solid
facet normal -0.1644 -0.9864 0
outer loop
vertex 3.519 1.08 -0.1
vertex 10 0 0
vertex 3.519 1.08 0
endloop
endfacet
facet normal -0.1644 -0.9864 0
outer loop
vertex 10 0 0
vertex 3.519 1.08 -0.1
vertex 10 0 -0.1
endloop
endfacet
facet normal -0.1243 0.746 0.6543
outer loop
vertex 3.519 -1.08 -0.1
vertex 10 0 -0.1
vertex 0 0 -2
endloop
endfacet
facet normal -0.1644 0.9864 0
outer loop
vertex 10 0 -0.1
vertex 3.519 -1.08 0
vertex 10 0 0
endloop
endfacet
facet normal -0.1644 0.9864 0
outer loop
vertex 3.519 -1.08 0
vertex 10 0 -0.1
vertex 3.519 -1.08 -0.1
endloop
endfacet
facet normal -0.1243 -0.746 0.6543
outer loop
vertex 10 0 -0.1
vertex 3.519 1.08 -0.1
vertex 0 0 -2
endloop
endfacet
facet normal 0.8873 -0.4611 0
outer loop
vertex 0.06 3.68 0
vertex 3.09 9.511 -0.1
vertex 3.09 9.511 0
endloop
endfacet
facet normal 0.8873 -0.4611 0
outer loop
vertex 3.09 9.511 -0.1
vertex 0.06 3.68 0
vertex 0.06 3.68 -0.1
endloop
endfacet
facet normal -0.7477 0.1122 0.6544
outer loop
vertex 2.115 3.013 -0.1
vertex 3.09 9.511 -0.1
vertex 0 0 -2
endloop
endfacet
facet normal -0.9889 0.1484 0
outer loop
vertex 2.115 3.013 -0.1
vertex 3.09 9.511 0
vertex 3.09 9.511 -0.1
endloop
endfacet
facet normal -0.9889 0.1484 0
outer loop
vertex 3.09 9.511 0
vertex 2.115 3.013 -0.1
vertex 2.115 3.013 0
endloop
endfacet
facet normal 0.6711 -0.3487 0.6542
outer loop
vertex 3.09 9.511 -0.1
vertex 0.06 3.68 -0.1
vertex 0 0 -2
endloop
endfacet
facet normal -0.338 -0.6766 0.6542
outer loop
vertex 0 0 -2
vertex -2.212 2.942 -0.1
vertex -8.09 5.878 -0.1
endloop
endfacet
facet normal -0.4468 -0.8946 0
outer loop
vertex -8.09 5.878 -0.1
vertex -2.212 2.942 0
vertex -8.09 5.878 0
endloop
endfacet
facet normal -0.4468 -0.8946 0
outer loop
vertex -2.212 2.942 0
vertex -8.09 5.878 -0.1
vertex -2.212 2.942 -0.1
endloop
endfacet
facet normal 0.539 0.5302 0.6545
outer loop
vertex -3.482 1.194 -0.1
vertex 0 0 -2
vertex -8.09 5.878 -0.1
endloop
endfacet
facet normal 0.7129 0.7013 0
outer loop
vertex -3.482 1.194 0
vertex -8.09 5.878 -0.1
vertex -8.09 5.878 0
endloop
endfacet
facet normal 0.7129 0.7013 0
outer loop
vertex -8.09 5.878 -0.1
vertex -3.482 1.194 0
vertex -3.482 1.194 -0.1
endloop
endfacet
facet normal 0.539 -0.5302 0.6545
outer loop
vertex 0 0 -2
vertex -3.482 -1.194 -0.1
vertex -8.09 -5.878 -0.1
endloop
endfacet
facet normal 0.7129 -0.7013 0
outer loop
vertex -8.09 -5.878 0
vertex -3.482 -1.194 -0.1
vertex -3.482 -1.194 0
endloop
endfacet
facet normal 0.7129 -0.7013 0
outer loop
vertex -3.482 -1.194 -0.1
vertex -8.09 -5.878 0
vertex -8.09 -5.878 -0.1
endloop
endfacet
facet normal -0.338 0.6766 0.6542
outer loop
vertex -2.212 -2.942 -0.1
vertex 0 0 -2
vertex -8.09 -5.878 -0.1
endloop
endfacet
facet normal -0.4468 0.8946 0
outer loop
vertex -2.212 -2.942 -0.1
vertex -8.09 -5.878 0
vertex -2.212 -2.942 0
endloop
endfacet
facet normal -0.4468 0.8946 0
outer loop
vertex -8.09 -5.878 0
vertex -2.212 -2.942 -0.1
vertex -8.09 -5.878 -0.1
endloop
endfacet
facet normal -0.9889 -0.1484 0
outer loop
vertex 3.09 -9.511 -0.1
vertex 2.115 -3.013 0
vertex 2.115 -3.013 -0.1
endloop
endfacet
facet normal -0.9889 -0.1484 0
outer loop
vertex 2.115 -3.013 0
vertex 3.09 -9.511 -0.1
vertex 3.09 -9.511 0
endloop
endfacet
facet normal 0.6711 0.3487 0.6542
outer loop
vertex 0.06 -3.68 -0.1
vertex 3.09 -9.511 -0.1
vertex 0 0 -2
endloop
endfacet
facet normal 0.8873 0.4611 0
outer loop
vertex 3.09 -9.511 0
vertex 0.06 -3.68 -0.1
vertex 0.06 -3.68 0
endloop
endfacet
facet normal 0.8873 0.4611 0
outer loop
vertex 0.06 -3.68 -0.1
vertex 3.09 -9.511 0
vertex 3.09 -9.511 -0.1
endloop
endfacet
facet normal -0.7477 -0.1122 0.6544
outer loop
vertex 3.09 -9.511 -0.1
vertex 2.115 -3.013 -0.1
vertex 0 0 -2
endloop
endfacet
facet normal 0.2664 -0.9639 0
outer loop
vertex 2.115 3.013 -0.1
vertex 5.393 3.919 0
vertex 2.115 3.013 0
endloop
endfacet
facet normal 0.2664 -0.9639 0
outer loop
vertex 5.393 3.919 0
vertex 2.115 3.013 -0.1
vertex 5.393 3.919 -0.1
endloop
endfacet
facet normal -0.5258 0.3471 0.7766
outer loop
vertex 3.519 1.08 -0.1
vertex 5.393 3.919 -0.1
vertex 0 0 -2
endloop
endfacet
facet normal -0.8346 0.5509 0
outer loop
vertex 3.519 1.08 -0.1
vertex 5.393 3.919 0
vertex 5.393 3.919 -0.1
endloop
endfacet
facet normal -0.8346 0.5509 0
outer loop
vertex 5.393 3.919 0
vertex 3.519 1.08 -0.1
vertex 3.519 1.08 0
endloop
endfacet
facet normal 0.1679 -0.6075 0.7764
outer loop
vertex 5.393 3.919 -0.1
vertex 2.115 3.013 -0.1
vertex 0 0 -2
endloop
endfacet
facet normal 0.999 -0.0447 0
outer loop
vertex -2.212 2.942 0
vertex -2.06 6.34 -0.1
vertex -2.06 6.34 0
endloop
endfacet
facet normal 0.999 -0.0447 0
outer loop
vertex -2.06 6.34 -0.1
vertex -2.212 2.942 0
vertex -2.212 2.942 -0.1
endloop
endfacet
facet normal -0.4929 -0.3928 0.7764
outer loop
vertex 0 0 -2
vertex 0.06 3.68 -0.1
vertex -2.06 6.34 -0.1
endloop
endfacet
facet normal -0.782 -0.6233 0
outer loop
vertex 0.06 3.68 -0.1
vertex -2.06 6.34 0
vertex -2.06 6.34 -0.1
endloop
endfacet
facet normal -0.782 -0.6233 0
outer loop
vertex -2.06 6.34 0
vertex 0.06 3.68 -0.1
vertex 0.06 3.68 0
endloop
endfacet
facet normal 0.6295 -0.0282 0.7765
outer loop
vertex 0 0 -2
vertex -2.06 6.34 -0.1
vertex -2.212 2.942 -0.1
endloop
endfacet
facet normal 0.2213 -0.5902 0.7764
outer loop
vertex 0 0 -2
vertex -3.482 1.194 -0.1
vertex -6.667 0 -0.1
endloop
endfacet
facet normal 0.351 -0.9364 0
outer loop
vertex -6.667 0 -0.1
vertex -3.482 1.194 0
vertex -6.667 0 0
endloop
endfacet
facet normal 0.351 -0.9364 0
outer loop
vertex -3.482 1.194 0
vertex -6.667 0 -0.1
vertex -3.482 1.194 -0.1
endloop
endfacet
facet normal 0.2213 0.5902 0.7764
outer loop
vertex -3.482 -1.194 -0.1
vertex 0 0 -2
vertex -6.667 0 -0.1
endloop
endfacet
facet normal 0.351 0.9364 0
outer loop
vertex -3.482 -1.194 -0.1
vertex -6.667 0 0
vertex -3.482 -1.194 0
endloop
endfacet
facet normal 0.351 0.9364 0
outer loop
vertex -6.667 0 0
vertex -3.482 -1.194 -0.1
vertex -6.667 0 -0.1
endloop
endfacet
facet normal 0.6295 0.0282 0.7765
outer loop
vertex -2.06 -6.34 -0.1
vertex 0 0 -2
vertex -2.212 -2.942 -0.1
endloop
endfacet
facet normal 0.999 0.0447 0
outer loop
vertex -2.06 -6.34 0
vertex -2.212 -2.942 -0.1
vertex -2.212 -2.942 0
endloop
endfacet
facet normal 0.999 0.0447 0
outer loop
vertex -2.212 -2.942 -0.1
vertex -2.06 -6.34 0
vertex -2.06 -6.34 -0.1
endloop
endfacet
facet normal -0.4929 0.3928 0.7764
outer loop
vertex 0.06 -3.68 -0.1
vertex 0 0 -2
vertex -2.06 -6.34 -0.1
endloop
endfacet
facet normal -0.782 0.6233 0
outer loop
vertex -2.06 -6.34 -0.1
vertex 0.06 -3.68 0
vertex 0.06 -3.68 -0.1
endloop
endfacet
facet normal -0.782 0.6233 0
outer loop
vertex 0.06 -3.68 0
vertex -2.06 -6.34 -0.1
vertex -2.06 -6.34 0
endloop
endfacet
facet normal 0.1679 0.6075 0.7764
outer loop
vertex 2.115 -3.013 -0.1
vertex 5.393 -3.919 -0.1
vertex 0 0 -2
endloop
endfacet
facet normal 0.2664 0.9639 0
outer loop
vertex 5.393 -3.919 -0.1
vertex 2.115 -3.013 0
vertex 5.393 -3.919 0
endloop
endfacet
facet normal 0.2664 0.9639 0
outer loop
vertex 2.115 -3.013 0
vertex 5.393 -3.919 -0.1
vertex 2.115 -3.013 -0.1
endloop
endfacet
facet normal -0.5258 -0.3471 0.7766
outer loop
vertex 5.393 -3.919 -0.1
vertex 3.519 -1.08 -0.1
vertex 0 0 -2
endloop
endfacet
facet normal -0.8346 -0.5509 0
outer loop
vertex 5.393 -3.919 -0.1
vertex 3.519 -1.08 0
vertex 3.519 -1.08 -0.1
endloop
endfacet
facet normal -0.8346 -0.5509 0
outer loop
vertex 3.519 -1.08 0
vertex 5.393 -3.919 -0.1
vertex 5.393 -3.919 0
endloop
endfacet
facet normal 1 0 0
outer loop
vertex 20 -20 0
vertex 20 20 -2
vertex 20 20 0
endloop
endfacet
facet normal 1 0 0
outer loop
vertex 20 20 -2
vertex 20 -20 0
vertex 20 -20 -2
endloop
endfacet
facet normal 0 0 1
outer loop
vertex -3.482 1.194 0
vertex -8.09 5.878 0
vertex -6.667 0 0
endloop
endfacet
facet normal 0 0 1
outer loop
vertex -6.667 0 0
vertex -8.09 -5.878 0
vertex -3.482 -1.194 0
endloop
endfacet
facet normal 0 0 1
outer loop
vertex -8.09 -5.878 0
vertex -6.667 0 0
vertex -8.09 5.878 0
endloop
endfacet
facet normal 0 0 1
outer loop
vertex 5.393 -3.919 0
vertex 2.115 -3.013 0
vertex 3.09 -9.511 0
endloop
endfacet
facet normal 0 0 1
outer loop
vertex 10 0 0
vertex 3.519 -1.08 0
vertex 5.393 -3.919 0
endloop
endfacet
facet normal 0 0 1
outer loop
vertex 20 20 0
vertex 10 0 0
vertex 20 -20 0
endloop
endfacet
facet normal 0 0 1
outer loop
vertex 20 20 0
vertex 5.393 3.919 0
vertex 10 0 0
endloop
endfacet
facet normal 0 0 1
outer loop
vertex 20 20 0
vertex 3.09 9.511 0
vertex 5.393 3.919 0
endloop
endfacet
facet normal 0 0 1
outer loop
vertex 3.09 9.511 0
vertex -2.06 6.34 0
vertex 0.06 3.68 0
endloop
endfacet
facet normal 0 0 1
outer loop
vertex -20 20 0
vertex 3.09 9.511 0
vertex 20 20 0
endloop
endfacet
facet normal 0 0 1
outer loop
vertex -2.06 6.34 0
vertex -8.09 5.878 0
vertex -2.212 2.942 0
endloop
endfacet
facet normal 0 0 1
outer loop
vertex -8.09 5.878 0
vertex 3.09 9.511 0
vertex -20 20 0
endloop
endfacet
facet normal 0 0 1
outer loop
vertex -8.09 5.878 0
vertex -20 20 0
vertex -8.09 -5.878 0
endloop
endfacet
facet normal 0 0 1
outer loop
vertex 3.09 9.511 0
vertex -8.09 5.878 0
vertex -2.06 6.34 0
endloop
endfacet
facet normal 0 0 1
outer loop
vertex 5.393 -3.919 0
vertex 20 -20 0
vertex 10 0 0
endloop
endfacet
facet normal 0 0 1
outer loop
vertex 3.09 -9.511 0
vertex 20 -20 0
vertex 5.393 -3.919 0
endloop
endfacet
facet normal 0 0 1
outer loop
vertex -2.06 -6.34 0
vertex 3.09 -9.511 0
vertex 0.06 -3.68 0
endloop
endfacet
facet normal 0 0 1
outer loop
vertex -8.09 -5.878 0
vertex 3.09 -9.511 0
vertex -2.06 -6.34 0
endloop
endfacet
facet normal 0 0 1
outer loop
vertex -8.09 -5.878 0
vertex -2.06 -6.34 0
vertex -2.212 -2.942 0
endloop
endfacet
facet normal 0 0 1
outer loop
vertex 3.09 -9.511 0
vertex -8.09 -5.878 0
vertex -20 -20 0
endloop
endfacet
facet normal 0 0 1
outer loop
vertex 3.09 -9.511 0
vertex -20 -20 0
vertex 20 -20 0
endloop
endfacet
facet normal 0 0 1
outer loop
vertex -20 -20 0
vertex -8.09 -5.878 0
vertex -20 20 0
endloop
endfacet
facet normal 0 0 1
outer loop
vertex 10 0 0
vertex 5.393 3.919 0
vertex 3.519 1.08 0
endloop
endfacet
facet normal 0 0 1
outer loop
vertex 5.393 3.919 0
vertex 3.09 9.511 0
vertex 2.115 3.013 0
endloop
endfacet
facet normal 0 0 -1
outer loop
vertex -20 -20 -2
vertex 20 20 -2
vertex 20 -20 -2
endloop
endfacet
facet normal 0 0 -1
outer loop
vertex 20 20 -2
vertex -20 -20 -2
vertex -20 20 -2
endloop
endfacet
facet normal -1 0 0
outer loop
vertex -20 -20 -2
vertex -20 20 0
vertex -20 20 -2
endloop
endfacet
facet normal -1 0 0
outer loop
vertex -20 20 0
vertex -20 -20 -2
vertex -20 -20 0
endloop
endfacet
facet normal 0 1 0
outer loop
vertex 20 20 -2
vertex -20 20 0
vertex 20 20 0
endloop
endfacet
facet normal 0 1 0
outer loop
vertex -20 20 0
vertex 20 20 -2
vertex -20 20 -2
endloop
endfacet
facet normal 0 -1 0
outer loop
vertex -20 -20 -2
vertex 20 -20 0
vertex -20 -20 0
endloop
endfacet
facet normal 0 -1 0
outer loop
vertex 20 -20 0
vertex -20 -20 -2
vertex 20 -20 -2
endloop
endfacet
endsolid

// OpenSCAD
precision = 20;

module hvezda_a(d, vertex_count = 5) {
    angle = 360 / vertex_count;

    function getPointR(x) = x % angle == 0 ? d : d / 2;
    function getPoint(x) = [getPointR(x) * cos(x), getPointR(x) * sin(x)];
    polygonPoints = [for (x = [0:angle / 2:360]) getPoint(x)];

    linear_extrude(1, center = true)
        polygon(polygonPoints);
}

module cip(r1, r2) {
    cylinder(d1 = 1, d2 = 0, h = 2, $fn=3);
    rotate([180, 0, 0])cylinder(d1 = 1, d2 = 0, h = 2, $fn=3);

    linear_extrude(0.2, center = true)
        polygon([
                [r1, 0],
                [0, r2],
                [0, - r2],
            ]);
}

module hvezda_b(d, vertex_count = 5) {
    angle = 360 / vertex_count;

    for (dz = [0:angle:360]) {
        rotate([0, 0, dz]) hull() cip(d / 2, d / 6);
    }
}

module hvezda_c(d, vertex_count = 4) {
    angle = 360 / vertex_count;
    angle2 = 2*angle;

    for (dz = [0:angle2:360]) {
        rotate([0, 0, dz]) hull() cip(d / 2, d / 12);
    }
    rotate([0, 0, angle]) {
        for (dz = [0:angle2:360]) {
            rotate([0, 0, dz]) hull() cip(d / 4, d / 12);
        }
    }
}

module hvezda_d(d, vertex_count = 4) {
    angle = 360 / vertex_count;
    angle2 = 2*angle;

    for (dz = [0:angle2:360]) {
        rotate([0, 0, dz]) hull() cip(d / 2, d / 12);
    }

    rotate([0, 0, angle]) {
        for (dz = [0:angle2:360]) {
            rotate([0, 0, dz]) hull() cip(d / 3, d / 8);
        }
    }
}

module mesic(d) {
    difference() {
        scale([1, 1, 4 / d]) sphere(d = d, $fn = precision);
        translate([d / 2, 0, 0]) sphere(d = d, $fn = precision);
    }
}

module kometa() {
}

difference() {
    translate([0, 0, - 1]) cube([40, 40, 2], center = true);
    //mesic(10);
    hvezda_d(20,10);
}
